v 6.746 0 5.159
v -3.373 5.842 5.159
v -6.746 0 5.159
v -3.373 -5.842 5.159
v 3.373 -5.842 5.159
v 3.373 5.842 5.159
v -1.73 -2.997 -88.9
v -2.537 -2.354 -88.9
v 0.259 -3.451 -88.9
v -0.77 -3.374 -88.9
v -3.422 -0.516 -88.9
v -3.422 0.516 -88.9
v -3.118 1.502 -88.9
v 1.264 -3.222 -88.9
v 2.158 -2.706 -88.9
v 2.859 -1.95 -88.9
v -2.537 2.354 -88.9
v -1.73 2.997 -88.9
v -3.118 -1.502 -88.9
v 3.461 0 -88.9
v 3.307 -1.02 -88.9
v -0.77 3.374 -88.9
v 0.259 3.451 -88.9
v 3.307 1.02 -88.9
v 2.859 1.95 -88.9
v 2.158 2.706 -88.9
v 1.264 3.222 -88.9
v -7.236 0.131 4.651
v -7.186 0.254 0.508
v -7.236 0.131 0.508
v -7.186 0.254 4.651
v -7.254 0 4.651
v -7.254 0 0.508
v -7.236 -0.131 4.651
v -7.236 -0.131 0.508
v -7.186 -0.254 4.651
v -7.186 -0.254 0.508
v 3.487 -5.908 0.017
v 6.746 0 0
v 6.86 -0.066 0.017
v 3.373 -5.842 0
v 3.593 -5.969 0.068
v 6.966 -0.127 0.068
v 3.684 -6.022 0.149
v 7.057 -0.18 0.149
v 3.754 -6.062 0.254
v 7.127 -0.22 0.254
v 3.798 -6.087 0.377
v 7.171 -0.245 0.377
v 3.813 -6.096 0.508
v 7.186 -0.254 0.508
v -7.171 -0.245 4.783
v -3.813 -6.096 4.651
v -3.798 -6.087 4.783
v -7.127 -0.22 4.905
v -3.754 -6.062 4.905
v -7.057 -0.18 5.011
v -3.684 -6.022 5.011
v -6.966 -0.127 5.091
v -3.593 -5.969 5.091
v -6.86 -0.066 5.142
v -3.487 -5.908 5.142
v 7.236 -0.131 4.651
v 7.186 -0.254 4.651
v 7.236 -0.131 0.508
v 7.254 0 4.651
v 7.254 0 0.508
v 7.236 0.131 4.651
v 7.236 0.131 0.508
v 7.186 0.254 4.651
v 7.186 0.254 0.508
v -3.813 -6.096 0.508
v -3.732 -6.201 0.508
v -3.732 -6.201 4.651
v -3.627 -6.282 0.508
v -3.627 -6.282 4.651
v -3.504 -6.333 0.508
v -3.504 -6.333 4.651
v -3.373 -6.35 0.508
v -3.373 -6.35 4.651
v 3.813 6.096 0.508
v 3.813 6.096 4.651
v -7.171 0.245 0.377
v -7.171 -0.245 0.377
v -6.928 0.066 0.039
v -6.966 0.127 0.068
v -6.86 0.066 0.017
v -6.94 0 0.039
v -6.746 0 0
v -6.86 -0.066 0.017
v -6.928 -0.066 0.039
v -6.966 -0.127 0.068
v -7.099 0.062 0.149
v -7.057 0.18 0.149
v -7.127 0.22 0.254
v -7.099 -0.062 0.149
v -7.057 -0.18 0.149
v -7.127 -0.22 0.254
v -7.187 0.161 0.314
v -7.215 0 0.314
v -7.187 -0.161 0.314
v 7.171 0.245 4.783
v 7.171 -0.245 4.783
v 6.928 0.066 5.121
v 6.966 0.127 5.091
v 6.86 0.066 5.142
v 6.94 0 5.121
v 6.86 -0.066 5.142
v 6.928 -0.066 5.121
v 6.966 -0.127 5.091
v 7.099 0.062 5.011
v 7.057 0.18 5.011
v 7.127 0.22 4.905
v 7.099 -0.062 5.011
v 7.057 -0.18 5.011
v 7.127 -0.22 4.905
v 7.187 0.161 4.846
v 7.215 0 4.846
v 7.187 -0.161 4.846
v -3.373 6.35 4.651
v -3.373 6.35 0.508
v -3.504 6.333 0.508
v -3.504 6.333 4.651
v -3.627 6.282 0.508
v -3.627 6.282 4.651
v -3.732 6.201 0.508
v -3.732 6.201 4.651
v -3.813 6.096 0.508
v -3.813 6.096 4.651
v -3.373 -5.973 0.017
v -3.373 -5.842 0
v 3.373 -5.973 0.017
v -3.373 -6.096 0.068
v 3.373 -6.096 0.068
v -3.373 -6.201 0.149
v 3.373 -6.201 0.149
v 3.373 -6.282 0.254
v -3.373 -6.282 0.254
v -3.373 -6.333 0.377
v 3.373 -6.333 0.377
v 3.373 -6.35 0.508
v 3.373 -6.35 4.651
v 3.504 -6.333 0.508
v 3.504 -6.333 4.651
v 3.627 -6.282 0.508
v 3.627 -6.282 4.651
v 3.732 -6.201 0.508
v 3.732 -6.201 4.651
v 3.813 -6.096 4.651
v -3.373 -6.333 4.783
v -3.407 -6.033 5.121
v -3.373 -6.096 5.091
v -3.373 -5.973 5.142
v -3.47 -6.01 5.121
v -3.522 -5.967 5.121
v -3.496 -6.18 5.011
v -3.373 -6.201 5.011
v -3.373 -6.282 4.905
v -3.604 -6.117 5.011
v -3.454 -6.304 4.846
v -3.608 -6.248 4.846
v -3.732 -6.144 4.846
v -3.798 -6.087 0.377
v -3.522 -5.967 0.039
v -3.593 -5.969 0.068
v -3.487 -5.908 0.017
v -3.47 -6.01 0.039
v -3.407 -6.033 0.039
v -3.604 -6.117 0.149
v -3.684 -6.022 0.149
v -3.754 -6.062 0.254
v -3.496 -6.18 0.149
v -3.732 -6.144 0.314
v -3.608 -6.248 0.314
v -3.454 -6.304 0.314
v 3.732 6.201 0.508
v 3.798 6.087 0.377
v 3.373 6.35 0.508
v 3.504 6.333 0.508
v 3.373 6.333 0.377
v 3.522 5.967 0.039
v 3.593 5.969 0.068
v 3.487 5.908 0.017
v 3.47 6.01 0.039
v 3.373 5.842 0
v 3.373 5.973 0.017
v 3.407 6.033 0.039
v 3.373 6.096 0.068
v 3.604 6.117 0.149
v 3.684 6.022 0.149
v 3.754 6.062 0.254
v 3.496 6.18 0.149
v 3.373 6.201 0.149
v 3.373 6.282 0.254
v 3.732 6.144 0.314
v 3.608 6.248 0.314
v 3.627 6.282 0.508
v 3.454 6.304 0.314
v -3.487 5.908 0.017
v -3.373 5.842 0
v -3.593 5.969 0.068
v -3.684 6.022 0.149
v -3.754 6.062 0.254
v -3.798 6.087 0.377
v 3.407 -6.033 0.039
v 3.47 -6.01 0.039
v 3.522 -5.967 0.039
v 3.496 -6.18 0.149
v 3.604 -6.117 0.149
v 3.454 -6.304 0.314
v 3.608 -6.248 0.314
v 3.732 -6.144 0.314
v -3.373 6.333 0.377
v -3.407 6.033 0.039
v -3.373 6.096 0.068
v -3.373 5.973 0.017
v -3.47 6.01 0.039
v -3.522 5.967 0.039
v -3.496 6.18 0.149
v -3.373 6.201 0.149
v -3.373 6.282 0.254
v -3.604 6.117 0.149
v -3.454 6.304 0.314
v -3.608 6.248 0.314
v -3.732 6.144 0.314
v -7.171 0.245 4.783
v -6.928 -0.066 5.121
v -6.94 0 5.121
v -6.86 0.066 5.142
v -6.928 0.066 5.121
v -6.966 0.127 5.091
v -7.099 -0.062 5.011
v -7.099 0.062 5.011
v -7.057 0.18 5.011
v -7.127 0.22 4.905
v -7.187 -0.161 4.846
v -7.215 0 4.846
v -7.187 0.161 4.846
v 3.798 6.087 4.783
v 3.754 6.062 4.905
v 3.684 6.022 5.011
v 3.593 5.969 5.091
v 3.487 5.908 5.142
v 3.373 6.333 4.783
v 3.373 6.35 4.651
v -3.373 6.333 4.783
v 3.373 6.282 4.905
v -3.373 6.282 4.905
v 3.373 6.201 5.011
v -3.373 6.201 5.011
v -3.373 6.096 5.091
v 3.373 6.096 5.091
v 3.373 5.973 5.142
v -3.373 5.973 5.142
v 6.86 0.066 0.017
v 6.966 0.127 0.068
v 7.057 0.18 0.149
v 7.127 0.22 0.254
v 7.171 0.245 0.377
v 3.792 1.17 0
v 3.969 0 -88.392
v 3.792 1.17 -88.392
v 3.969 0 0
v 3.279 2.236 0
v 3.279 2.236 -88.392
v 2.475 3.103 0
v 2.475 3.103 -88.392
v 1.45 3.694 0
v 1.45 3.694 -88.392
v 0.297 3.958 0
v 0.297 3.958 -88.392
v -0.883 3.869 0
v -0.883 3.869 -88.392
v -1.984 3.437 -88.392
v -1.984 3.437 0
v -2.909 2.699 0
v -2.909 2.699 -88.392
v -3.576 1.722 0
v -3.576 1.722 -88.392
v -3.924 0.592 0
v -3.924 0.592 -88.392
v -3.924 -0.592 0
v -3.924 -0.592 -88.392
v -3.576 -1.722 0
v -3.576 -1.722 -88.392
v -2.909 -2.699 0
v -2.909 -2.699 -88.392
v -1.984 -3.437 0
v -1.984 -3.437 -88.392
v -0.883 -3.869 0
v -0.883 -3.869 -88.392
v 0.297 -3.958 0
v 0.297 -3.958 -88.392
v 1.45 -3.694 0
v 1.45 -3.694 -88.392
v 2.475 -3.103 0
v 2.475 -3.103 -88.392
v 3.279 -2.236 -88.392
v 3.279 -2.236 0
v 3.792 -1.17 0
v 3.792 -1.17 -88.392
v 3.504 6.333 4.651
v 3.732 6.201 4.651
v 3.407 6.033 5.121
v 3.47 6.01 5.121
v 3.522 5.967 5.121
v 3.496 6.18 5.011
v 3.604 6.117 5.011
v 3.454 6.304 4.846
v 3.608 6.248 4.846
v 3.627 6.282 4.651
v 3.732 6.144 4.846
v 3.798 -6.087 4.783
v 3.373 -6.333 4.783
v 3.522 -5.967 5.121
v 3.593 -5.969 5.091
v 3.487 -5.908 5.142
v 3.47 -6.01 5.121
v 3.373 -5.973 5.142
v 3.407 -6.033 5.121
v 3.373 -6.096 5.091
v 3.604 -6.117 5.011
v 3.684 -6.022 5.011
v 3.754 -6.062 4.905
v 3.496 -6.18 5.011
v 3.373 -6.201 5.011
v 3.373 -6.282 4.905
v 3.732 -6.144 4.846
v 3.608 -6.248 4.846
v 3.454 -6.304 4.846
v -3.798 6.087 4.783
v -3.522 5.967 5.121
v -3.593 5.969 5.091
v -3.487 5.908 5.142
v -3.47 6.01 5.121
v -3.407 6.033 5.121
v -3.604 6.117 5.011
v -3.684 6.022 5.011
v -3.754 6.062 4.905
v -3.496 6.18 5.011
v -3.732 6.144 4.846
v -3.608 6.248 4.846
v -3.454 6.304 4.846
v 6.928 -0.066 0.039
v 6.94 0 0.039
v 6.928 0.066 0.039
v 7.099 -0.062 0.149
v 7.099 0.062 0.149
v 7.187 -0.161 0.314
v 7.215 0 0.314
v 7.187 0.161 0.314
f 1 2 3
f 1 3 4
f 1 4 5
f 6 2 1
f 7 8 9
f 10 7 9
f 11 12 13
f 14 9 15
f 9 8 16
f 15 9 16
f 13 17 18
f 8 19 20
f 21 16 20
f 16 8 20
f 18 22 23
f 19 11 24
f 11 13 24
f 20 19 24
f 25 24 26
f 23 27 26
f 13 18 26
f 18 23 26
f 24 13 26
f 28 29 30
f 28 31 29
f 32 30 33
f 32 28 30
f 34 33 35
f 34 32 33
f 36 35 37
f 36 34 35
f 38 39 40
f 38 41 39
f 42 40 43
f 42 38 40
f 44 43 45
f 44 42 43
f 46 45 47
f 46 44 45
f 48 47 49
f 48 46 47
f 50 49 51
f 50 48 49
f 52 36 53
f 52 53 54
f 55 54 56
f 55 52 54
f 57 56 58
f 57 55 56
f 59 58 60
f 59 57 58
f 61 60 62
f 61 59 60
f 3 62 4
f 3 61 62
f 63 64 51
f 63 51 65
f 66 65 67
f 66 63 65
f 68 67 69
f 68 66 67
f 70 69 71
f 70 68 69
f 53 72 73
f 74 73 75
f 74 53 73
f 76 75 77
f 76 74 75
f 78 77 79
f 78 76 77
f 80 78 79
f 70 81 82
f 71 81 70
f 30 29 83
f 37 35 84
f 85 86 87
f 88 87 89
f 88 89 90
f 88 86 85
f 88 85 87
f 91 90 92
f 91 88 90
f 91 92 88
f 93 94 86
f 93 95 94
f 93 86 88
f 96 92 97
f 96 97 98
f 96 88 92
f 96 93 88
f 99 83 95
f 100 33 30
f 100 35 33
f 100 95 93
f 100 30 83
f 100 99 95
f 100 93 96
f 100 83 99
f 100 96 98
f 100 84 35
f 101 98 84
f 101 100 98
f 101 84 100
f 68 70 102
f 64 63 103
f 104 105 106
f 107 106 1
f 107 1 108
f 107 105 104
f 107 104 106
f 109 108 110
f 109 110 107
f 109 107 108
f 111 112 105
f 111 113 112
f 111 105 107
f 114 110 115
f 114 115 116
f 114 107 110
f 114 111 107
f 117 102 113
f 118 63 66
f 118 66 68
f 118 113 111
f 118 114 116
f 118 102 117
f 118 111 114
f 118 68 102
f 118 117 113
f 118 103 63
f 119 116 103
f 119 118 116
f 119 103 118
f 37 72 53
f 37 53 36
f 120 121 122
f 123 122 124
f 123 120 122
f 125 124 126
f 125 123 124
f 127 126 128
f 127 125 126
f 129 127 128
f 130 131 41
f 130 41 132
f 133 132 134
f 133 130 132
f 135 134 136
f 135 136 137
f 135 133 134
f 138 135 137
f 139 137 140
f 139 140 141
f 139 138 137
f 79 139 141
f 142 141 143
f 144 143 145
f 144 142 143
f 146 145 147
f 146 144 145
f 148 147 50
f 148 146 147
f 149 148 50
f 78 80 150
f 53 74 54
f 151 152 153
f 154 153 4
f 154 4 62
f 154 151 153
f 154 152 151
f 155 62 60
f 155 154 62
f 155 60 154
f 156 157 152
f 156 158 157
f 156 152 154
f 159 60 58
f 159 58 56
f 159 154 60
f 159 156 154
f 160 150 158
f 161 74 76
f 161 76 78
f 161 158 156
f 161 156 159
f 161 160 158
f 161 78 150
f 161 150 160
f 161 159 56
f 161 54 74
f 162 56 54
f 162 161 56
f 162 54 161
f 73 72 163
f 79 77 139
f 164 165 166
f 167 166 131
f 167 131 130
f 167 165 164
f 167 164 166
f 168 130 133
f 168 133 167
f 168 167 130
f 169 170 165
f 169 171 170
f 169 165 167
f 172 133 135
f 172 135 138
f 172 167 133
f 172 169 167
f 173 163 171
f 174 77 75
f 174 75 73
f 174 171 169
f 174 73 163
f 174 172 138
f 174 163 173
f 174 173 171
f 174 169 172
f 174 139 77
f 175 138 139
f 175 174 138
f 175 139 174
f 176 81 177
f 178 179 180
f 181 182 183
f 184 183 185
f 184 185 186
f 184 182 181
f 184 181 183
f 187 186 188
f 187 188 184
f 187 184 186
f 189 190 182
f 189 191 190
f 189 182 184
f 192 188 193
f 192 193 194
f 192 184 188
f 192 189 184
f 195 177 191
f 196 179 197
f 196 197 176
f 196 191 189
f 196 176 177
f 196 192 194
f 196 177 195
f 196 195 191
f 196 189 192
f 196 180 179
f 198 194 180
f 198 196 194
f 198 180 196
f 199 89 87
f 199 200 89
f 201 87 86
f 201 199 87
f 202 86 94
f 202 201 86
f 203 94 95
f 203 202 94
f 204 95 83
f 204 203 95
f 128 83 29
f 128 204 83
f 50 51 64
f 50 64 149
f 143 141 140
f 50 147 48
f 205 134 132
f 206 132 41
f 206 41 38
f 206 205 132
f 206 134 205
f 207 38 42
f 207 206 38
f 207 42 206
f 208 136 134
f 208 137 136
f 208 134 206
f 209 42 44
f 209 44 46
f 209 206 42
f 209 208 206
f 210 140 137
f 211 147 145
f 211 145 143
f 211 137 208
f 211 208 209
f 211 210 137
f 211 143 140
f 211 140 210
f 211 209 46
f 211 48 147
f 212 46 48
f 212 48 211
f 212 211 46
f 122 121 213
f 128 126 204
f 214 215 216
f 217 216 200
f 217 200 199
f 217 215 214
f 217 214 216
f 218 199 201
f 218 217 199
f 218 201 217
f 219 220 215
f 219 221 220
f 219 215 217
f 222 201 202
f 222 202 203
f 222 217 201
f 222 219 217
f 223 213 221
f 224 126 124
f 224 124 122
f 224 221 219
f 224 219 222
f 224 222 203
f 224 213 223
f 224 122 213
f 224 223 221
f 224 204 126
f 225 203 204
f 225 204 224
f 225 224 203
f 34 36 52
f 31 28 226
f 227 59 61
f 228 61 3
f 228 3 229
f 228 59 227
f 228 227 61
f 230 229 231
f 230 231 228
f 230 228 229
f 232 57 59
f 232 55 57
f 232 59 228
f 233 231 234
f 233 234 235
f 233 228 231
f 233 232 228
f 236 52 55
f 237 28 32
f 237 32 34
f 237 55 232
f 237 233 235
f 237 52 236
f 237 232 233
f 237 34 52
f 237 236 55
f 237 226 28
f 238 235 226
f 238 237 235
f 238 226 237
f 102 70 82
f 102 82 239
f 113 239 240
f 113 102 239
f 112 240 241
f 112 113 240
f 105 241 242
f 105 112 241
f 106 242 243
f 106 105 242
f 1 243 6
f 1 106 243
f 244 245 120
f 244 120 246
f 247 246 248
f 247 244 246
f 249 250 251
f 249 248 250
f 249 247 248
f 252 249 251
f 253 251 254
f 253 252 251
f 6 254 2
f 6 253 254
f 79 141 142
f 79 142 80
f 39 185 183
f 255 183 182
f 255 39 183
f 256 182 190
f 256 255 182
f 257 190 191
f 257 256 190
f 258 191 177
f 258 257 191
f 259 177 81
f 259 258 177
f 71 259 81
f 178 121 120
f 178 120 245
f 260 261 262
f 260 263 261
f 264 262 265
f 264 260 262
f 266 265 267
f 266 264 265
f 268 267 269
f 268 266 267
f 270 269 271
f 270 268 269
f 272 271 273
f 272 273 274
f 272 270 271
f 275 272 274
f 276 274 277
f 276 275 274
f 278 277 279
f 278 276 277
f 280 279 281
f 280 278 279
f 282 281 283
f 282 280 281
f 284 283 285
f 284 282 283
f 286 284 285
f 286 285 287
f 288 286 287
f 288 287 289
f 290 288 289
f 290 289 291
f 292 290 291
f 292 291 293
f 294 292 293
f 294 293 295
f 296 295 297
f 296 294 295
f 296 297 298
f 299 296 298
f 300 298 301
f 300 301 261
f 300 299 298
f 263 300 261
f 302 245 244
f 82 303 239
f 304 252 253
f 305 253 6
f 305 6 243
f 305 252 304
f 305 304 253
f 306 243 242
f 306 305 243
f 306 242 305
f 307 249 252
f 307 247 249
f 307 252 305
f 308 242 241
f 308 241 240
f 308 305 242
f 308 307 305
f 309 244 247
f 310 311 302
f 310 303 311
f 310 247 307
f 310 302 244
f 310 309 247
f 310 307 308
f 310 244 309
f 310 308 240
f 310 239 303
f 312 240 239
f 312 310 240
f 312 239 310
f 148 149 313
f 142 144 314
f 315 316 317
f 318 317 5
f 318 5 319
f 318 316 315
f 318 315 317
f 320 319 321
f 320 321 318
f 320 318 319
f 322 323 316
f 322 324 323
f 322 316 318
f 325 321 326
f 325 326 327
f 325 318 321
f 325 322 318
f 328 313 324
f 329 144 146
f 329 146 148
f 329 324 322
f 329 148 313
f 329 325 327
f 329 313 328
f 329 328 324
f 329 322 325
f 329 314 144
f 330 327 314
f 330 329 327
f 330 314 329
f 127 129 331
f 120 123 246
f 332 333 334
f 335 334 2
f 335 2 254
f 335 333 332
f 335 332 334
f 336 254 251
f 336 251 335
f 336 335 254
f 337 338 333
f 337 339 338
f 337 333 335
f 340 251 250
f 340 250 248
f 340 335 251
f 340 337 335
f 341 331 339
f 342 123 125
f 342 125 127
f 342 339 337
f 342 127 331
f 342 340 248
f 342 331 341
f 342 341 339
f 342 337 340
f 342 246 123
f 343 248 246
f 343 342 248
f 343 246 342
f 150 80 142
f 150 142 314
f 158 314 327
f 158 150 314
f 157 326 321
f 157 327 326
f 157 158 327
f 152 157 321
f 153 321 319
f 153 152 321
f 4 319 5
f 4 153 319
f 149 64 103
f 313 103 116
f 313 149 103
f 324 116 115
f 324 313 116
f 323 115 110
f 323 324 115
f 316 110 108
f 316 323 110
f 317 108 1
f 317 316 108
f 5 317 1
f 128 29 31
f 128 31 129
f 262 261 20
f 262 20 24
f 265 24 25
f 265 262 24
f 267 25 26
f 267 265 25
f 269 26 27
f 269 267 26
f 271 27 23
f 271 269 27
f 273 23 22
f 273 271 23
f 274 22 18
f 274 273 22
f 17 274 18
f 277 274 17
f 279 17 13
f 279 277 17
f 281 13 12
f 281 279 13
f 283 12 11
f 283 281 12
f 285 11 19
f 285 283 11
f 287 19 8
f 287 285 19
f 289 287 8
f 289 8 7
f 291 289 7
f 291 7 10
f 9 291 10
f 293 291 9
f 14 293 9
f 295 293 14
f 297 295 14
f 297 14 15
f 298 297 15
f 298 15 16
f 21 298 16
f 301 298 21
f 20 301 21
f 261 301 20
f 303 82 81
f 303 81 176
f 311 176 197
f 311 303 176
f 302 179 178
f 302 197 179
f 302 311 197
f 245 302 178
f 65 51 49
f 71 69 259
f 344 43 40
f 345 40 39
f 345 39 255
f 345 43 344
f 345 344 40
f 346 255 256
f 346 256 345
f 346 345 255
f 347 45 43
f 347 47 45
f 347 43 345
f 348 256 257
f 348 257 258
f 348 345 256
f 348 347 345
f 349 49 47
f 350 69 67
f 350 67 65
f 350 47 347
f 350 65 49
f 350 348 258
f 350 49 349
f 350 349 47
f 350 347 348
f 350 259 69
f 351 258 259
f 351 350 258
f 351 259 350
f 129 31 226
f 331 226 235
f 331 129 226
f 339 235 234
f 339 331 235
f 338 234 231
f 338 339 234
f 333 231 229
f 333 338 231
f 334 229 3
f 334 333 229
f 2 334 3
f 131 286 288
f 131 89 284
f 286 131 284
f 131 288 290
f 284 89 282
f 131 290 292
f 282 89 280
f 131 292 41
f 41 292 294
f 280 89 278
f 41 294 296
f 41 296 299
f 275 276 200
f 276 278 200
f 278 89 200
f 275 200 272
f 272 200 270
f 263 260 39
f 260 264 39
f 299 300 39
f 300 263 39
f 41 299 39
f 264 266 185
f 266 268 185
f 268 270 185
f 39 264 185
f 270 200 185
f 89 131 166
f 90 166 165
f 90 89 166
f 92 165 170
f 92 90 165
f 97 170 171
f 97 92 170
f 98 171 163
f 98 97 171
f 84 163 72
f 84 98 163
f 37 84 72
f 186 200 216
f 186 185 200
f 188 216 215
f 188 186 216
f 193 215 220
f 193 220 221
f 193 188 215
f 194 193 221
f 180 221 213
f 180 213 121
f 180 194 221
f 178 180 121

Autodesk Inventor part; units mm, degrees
ref_plane "YZ Plane" through (0, 0, 0) normal (1, 0, 0) x (0, 1, 0)
ref_plane "XZ Plane" through (0, 0, 0) normal (0, 1, 0) x (-1, 0, 0)
ref_plane "XY Plane" through (0, 0, 0) normal (0, 0, 1) x (1, 0, 0)
sketch "Sketch1" plane through (0, 0, 0) normal (0, 0, 1) x (1, 0, 0)
  circle A0 centre (0, 0) radius 3.9688
  dimension "d0" = 7.9375
extrude "Extrusion1" add sketch "Sketch1" against normal blind 88.9
sketch "Sketch2" plane through (0, 0, 0) normal (0, 0, 1) x (1, 0, 0)
  circle A0 centre (0, 0) radius 3.9687 projected
  line L0 (-7.3323, 0) -> (-3.6662, 6.35)
  line L1 (-3.6662, 6.35) -> (3.6662, 6.35)
  line L2 (3.6662, 6.35) -> (7.3323, 0)
  line L3 (7.3323, 0) -> (3.6662, -6.35)
  line L4 (3.6662, -6.35) -> (-3.6662, -6.35)
  line L5 (-3.6662, -6.35) -> (-7.3323, 0)
  dimension "d3" = 12.7
extrude "Extrusion2" add sketch "Sketch2" along normal blind 5.1594 contours A0 | L0 L1 L2 L3 L4 L5
thread "Thread1" size "5/16-18 UNC" class "2A" standard "ANSI Unified Screw Threads" length 25.4
chamfer "Chamfer1" distance 0.508 angle 45 1 edges at (-3.9688, 0, -88.9)
fillet "Fillet1" radius 0.508 18 edges at (0, 6.35, 5.1594) (-5.4993, 3.175, 5.1594) (-5.4993, -3.175, 5.1594) (0, -6.35, 5.1594) (5.4993, -3.175, 5.1594) (5.4993, 3.175, 5.1594) (-5.4993, 3.175, 0) (0, 6.35, 0) (5.4993, 3.175, 0) (5.4993, -3.175, 0) (0, -6.35, 0) (-5.4993, -3.175, 0) (7.3323, 0, 2.5797) (3.6662, -6.35, 2.5797) (3.6662, 6.35, 2.5797) (-3.6662, -6.35, 2.5797) (-7.3323, 0, 2.5797) (-3.6662, 6.35, 2.5797)
properties part number "375 bolt x4" material "Steel"
